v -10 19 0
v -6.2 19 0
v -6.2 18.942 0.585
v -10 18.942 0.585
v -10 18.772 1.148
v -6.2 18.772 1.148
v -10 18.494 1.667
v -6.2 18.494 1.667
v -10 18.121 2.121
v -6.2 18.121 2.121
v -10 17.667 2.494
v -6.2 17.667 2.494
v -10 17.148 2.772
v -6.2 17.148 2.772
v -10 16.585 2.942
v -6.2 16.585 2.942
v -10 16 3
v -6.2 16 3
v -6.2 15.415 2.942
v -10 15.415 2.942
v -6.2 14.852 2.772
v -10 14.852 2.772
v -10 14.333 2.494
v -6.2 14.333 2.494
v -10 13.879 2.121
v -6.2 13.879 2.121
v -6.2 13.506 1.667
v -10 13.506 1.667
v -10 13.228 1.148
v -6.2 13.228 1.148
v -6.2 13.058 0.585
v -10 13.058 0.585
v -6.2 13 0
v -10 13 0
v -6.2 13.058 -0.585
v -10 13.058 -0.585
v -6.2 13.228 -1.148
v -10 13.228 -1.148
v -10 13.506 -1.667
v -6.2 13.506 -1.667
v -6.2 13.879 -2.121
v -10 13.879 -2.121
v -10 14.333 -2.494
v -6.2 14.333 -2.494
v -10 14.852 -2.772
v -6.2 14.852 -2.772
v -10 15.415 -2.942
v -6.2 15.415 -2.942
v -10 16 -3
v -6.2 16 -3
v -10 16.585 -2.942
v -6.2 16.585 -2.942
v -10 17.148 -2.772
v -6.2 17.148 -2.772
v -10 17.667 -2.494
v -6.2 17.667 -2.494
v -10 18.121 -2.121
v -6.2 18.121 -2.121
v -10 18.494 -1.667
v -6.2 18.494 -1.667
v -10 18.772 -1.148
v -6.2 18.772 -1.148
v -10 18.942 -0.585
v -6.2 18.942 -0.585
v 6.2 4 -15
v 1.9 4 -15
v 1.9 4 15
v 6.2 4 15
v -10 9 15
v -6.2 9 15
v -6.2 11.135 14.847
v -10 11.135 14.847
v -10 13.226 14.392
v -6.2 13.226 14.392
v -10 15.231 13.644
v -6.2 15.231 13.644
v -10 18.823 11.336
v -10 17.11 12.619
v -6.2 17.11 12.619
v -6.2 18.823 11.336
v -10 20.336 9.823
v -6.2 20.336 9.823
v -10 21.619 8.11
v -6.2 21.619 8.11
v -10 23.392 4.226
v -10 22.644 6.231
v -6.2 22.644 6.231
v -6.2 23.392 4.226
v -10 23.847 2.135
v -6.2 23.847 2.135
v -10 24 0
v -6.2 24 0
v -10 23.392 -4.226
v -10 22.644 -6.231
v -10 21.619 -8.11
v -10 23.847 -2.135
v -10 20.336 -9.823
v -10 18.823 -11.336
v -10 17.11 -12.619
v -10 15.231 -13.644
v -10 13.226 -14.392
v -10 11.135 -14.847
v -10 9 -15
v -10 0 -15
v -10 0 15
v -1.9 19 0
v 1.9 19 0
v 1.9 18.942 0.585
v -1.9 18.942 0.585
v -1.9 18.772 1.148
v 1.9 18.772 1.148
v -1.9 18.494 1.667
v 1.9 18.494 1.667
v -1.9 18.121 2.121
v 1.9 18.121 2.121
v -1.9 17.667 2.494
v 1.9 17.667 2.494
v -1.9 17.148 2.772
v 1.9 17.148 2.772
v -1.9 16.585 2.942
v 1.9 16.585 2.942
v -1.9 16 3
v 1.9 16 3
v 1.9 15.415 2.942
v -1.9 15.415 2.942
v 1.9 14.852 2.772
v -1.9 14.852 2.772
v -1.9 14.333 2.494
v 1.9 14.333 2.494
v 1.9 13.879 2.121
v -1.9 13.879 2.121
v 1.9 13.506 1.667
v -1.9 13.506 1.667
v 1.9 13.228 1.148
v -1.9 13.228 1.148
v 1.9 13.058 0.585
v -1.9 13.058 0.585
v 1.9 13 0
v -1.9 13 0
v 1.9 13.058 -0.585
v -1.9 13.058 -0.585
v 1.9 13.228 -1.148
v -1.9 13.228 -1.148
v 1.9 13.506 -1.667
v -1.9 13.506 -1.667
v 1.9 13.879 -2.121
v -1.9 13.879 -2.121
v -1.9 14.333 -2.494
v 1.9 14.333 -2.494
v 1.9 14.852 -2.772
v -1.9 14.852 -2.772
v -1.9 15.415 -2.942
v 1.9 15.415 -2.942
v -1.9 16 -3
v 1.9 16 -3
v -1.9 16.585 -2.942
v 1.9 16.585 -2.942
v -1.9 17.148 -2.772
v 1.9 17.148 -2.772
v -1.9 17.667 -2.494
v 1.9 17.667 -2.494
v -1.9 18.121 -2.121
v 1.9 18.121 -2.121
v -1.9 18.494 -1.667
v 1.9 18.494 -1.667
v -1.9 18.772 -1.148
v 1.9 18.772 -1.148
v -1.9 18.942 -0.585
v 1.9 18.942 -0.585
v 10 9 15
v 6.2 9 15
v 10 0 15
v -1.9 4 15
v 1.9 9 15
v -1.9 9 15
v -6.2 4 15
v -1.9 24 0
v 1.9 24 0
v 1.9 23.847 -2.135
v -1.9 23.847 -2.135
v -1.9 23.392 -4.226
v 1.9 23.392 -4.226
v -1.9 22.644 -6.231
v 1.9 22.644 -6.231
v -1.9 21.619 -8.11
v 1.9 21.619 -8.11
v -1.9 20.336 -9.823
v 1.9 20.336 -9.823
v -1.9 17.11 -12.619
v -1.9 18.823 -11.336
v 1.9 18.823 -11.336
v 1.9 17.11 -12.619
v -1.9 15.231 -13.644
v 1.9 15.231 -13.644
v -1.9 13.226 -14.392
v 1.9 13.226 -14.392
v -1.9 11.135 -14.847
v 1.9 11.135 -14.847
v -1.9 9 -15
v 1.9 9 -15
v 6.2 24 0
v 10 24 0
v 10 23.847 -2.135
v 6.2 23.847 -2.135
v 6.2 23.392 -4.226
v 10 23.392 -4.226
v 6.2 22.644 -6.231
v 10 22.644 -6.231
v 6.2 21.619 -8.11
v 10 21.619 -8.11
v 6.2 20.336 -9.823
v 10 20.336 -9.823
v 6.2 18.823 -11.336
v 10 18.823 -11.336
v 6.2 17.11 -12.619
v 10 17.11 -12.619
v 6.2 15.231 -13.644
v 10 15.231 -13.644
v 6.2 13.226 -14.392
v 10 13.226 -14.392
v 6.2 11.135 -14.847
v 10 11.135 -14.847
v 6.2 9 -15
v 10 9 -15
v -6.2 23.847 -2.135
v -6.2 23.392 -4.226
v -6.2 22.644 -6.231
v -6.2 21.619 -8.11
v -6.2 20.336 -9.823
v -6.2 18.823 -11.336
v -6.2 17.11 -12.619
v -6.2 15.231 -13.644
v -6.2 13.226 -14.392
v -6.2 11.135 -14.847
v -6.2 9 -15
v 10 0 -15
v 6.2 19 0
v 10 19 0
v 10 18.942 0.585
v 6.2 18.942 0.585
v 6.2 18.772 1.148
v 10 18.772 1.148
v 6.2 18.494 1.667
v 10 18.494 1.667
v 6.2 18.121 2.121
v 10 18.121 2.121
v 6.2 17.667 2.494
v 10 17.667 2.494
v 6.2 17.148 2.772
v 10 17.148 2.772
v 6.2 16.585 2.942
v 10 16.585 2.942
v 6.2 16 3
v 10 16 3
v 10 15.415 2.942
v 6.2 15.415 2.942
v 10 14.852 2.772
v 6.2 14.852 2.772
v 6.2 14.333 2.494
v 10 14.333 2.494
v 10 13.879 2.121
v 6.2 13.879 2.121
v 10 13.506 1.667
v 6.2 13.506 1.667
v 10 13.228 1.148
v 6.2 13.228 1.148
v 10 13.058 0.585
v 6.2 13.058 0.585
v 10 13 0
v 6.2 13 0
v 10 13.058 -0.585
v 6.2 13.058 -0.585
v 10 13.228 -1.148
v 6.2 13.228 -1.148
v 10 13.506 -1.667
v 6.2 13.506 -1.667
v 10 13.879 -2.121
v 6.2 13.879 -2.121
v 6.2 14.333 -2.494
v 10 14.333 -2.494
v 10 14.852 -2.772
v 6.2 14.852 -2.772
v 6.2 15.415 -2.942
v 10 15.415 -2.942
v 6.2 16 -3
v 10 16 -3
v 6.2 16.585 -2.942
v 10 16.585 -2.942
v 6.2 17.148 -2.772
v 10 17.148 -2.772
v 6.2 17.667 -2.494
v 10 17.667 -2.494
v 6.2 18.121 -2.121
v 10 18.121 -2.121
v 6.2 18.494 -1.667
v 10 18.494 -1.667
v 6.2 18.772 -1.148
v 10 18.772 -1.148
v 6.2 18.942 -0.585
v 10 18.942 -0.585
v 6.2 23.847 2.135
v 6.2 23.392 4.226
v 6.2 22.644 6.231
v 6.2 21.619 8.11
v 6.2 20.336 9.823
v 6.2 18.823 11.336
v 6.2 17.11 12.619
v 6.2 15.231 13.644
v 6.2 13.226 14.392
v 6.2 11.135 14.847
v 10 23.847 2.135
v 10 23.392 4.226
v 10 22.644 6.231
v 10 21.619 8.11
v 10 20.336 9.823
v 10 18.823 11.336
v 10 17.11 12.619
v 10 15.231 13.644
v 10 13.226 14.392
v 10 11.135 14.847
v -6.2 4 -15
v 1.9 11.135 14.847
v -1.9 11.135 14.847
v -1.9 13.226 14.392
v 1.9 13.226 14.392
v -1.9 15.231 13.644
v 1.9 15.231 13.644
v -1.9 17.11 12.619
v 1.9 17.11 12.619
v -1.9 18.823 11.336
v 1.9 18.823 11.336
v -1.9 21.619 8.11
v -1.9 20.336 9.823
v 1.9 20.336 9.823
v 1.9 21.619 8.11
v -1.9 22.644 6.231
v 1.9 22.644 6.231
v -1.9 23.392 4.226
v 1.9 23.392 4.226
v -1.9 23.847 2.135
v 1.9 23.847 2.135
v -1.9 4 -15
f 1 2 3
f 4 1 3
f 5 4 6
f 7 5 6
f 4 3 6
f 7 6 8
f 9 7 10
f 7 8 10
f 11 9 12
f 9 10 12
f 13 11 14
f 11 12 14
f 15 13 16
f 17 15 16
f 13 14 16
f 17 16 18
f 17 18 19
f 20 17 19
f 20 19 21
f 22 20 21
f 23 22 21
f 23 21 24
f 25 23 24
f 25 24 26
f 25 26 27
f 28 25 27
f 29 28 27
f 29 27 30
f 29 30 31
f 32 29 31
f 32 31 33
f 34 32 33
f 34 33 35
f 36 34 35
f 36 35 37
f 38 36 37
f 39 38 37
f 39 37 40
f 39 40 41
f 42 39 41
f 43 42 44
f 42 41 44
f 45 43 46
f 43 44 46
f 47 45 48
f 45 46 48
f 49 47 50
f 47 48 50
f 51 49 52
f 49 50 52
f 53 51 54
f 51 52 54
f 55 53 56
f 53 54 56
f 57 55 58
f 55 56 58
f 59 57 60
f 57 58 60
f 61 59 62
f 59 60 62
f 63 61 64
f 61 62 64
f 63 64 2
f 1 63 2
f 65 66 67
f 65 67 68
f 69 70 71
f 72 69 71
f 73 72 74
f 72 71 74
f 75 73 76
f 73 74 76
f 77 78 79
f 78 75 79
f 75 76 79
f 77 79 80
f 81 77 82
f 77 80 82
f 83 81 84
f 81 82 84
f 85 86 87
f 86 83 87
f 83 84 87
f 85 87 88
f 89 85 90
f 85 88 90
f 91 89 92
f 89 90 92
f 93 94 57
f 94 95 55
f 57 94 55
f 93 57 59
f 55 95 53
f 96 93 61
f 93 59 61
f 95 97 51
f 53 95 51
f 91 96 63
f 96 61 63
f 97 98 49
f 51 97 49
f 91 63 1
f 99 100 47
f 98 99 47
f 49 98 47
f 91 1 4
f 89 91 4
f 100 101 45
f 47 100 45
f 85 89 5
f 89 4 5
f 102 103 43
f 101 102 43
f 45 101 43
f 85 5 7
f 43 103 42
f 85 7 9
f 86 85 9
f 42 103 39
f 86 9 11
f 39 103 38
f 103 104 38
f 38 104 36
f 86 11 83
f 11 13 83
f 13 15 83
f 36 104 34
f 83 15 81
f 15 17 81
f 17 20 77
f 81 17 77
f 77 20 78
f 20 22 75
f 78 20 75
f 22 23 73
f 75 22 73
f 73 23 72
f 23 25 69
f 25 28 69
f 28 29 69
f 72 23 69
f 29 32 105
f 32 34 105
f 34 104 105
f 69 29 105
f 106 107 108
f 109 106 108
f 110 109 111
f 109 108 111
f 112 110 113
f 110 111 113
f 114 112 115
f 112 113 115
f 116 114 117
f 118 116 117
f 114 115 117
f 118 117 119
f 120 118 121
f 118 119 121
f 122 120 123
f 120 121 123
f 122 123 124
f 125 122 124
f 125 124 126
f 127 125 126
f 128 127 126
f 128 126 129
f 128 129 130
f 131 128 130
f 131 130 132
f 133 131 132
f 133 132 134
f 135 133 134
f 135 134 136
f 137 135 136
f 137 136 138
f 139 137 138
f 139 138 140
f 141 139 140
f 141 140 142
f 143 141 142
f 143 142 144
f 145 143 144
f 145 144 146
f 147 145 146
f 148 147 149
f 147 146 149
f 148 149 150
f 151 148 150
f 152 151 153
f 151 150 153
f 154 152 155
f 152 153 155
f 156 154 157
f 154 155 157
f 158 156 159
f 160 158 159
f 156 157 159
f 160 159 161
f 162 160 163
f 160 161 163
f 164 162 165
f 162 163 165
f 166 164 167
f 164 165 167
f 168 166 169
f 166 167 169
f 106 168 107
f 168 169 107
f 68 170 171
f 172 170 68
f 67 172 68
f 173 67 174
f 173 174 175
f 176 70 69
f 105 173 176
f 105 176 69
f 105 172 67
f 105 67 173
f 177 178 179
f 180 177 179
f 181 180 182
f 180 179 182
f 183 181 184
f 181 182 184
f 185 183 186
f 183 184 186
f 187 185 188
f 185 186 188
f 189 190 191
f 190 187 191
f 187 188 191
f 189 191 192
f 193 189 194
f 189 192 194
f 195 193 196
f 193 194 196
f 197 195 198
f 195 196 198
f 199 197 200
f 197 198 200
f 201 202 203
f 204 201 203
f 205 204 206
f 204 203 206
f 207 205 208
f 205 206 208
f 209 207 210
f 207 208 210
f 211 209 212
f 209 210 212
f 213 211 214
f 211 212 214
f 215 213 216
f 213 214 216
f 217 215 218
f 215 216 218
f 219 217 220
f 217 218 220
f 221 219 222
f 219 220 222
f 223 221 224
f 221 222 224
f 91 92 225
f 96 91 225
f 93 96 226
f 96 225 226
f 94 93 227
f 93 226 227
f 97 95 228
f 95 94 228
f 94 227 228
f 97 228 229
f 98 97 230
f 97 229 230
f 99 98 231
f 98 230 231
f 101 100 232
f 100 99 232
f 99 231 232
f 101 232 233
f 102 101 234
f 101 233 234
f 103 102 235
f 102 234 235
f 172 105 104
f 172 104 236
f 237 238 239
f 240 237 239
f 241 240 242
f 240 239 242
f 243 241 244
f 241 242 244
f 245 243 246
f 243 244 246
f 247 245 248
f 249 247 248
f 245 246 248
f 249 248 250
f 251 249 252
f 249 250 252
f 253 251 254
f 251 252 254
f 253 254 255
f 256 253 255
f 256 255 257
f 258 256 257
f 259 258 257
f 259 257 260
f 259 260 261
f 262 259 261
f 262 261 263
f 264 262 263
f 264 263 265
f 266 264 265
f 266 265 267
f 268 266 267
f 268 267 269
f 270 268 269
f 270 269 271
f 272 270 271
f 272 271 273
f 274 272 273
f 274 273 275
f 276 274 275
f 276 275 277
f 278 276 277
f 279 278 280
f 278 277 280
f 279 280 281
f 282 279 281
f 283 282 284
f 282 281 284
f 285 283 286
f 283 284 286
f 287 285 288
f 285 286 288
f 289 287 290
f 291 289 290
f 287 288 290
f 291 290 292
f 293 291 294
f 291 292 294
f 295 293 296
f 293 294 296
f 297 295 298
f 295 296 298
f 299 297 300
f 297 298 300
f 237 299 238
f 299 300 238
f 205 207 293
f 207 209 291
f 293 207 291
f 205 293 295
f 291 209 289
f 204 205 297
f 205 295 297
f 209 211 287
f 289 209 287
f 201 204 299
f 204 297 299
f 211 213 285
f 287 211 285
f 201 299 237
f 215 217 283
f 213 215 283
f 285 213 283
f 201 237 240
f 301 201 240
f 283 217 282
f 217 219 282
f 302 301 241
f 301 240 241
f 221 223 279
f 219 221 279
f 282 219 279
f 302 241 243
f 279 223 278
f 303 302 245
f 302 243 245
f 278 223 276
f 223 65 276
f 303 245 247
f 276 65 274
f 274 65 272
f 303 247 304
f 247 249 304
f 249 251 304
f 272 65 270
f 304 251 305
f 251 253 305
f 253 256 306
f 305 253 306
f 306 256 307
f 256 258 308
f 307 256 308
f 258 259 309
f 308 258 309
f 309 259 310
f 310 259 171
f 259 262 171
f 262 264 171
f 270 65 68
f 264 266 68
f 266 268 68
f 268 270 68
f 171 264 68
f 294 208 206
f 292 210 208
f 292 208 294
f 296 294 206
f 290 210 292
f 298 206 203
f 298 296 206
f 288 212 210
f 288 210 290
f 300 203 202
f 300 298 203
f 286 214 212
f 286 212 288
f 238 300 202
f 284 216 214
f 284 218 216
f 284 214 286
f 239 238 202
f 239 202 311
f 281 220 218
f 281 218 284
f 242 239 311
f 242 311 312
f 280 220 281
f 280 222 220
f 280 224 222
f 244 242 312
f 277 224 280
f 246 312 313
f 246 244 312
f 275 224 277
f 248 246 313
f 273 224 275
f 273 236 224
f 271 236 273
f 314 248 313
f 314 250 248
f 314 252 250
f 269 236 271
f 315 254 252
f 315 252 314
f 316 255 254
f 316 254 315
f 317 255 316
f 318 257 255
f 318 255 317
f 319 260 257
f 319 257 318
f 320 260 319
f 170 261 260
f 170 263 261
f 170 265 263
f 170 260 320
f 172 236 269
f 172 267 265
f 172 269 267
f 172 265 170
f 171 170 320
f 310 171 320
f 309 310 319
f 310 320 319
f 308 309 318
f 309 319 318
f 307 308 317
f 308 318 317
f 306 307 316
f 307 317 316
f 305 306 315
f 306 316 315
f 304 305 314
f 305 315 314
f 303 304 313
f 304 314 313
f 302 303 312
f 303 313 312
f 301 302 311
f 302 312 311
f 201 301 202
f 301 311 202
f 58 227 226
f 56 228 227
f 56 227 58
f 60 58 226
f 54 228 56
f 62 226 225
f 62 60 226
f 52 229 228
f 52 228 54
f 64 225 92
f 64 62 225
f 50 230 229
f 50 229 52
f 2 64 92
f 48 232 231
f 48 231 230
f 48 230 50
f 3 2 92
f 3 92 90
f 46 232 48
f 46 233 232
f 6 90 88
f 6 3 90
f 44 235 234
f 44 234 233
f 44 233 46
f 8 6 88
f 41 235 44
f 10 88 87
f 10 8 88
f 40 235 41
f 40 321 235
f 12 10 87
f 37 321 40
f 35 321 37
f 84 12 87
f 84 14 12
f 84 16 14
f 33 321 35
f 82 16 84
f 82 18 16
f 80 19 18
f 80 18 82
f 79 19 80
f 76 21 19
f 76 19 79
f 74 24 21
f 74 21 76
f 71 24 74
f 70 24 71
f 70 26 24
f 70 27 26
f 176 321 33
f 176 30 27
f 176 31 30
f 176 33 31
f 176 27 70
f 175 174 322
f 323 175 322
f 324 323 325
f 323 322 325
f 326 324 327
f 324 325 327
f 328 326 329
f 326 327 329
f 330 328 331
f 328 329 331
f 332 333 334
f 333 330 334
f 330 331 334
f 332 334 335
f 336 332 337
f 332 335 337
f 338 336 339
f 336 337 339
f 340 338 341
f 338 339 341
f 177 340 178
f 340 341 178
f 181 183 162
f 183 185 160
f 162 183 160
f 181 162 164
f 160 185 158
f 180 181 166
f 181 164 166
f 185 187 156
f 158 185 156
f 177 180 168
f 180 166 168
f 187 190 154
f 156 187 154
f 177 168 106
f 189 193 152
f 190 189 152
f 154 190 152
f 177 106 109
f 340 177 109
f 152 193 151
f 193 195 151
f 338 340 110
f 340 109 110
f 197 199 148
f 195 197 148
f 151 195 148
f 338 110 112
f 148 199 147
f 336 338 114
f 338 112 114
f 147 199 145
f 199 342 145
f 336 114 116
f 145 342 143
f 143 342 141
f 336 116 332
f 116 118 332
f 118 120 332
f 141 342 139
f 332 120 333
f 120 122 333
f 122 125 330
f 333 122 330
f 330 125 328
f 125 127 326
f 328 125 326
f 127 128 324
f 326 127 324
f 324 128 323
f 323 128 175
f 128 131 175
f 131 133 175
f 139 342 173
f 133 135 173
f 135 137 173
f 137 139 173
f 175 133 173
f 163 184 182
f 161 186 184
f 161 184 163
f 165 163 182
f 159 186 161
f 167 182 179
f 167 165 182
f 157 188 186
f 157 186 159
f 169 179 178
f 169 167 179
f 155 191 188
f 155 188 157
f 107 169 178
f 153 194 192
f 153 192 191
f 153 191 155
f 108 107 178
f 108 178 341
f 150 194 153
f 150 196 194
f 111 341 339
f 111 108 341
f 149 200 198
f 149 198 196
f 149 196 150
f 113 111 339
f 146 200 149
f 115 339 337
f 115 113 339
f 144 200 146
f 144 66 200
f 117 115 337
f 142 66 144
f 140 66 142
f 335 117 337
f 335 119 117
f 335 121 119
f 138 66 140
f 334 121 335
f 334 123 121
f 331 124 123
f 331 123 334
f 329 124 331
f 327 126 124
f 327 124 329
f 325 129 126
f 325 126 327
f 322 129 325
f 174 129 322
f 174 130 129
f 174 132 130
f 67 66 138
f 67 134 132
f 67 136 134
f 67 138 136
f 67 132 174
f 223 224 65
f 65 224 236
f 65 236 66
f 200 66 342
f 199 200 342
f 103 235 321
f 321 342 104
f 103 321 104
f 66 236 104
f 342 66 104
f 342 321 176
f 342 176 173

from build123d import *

# Parameters (mm, degrees)
F0_W     = 20
F0_H     = 30
F1_DEPTH = 4
F2_W     = 3.8
F2_H     = 30
F3_DEPTH = 20
F5_DEPTH = 25
F6_R     = 3
F7_DEPTH = 25


with BuildPart() as f1:
    # F0 (on Front) → F1 (new body)
    with BuildSketch(Plane.XZ):
        Rectangle(F0_W, F0_H)
    extrude(amount=-F1_DEPTH)

    # F2 (on face) → F3 (join)
    with BuildSketch(Plane(origin=(0, 4, 0), x_dir=(-1, 0, 0), z_dir=(0, 1, 0))):
        with Locations((-8.1, 0)):
            Rectangle(F2_W, F2_H)
        with Locations((8.1, 0)):
            Rectangle(F2_W, F2_H)
        Rectangle(F2_W, F2_H)
    extrude(amount=F3_DEPTH)

    # F4 (on face) → F5 (cut)
    with BuildSketch(Plane.YZ.offset(10)):
        with BuildLine():
            ThreePointArc((9, 15), (19.606602, 10.606602), (24, 0))
            Line((24, 0), (24, 15))
            Line((24, 15), (9, 15))
        make_face()
        with BuildLine():
            Line((24, -15), (24, 0))
            ThreePointArc((24, 0), (19.606602, -10.606602), (9, -15))
            Line((9, -15), (24, -15))
        make_face()
    extrude(amount=-F5_DEPTH, mode=Mode.SUBTRACT)

    # F6 (on face) → F7 (cut)
    with BuildSketch(Plane.YZ.offset(10)):
        with Locations((16, 0)):
            Circle(F6_R)
    extrude(amount=-F7_DEPTH, mode=Mode.SUBTRACT)


solid = f1.part
